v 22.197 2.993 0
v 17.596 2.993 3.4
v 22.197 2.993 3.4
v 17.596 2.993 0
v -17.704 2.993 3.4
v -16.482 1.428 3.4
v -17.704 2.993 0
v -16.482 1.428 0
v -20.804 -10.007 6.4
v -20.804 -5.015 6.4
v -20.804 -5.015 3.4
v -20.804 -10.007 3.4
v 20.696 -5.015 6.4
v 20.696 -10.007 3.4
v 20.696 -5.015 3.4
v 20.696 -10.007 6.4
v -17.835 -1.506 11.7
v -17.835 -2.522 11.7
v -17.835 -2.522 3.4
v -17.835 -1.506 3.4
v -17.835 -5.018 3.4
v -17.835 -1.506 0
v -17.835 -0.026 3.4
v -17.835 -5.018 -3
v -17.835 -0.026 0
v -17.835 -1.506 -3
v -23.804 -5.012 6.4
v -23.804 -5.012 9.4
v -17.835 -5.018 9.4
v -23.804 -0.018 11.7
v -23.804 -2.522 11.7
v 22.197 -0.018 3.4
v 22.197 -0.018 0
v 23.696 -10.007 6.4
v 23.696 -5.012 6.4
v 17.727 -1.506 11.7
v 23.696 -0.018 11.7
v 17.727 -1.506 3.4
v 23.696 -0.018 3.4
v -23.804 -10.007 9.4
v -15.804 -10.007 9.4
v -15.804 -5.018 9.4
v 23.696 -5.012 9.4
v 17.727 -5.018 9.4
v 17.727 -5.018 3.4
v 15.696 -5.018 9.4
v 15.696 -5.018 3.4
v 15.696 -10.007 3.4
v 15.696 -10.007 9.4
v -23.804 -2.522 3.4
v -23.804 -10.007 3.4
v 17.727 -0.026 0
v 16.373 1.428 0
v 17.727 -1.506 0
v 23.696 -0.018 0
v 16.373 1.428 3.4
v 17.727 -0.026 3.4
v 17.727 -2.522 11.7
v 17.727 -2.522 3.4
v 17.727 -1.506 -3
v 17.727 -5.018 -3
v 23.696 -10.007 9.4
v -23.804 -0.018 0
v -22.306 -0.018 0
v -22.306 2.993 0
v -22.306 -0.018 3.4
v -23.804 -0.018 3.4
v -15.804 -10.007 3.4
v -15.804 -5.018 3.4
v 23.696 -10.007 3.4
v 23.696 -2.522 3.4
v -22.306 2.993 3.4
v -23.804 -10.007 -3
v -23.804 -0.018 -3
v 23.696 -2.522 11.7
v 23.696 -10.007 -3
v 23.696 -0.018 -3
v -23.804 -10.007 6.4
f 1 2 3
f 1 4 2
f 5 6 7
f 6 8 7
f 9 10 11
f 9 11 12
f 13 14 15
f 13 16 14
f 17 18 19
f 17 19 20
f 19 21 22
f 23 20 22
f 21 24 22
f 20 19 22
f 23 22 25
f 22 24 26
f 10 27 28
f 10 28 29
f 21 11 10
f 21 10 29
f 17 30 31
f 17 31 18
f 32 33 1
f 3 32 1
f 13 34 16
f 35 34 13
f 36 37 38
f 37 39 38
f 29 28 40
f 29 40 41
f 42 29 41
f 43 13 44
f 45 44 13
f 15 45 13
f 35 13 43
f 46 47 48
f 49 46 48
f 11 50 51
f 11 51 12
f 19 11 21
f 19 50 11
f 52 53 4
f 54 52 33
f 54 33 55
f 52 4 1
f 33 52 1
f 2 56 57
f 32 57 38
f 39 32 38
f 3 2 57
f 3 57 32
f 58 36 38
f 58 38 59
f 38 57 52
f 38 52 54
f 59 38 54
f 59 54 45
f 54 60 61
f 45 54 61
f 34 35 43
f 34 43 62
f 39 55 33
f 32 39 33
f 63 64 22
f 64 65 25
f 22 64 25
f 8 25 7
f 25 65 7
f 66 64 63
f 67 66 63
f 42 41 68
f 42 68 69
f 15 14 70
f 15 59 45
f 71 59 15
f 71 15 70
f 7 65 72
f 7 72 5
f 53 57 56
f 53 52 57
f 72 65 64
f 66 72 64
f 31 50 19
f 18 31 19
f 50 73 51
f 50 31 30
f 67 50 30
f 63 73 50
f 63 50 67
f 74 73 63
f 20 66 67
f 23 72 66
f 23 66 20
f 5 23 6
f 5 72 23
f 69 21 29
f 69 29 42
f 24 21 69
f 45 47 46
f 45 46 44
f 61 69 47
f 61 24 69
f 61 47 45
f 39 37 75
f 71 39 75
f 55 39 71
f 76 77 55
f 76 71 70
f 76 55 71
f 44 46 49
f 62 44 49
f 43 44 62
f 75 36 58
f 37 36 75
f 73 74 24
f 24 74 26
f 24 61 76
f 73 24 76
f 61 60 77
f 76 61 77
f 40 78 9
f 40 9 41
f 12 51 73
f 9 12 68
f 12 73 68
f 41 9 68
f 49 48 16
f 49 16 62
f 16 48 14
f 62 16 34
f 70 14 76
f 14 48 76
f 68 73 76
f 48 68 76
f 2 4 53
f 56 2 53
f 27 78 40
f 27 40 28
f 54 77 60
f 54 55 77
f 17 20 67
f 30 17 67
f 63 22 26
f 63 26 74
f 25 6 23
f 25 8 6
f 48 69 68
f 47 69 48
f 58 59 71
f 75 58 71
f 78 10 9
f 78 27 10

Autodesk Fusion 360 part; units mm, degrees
sketch "Sketch1" plane through (0, 0, 0) normal (0, 0, 1) x (1, 0, 0)
  line L0 (23.6957, -0.0182) -> (23.6957, -10.0069)
  line L1 (-0.0543, -10.0069) -> (23.6957, -10.0069)
  line L2 (17.7267, -0.0264) -> (17.7267, -5.0176)
  line L3 (-0.0543, -5.0176) -> (17.7267, -5.0176)
  line L4 (5.1457, -10.0069) -> (5.1457, -5.0176)
  line L5 (17.7267, -0.0264) -> (16.3734, 1.4275)
  line L6 (17.5959, 2.993) -> (16.3734, 1.4275)
  line L7 (23.6957, -0.0182) -> (22.197, -0.0182)
  line L8 (23.6957, -0.0182) -> (17.7267, -1.5064)
  line L9 (-0.0543, -5.0176) -> (-0.0543, -10.0069)
  line L10 (17.5959, 2.993) -> (22.197, 2.993)
  line L11 (22.197, -0.0182) -> (22.197, 2.993)
  line L12 (23.6957, -0.0182) -> (22.197, -0.0182) construction
  line L13 (17.7267, -5.0176) -> (23.6957, -5.0125)
  line L14 (15.6957, -5.0176) -> (15.6957, -10.0069)
  line L15 (20.6957, -5.0176) -> (20.6957, -10.0069)
  line L16 (17.7267, -2.522) -> (23.6957, -2.522)
  point P0 (17.7267, -0.0264)
  point P1 (5.1457, -10.0069)
  dimension "latch_width" = 5.969
  dimension "d8" = 5.2
  dimension "d16" = 14
  dimension "d26" = 3
  dimension "d27" = 5
  dimension "d41" = 23.75
extrude "Extrude4" add sketch "Sketch1" along normal blind 3.4 makes body 1
extrude "Extrude9" add sketch "Sketch1" against normal blind 3 contours L0 L2 L8 L16 | L0 L2 L13 L16 | L0 L1 L3 L13 L14 | L1 L3 L4 L14 | L1 L3 L4 L9 bodies 1
extrude "Extrude5" add sketch "Sketch1" along normal blind 11.7 contours L0 L2 L8 L16 bodies 1
extrude "Extrude6" add sketch "Sketch1" along normal blind 9.4 contours L0 L1 L3 L13 L14 bodies 1
sketch "Sketch2" plane through (23.6957, 0, 0) normal (1, 0, 0) x (0, 1, 0)
  line L0 (-0.0182, 0) -> (-0.0182, 3.4)
  line L1 (-0.0182, 3.4) -> (-0.0182, 11.7)
  line L2 (-0.0182, 11.7) -> (-2.522, 11.7)
  line L3 (-2.522, 11.7) -> (-2.522, 3.4)
  line L4 (-2.522, 3.4) -> (-5.0125, 3.4)
  line L5 (-5.0125, 3.4) -> (-5.0125, 9.4)
  line L6 (-5.0125, 9.4) -> (-10.0069, 9.4)
  line L7 (-10.0069, 9.4) -> (-10.0069, -3)
  line L8 (-5.0125, 3.4) -> (-10.0069, 3.4)
  line L9 (-10.0069, 3.4) -> (-10.0069, 6.4)
  line L10 (-10.0069, 6.4) -> (-5.0125, 6.4)
  line L11 (-5.0125, 6.4) -> (-5.0125, 3.4)
  line L12 (-10.0069, -3) -> (-0.0182, -3)
  line L13 (-0.0182, -3) -> (-0.0182, 0)
  dimension "d34" = 3
extrude "Extrude7" cut sketch "Sketch2" against normal blind 3 contours L5 L7 L8 L9 L10 L11 bodies 1
mirror "Mirror1" about plane through (-0.0543, -5.0176, 0) normal (-1, 0, 0) of bodies 1 makes body 2
extrude "Extrude8" add 1 faces at (-0.0543, -8.3438, 1.2667) along direction (-1, 0, 0) blind 2 on bodies 1 bodies 1 2
equation "usbconn_width = 10.4 mm"
equation "usbconn_height = 8.3 mm"
equation "d8 = usbconn_width / 2"
equation "slot_height = 3.4 mm"
equation "d28 = slot_height"
equation "d30 = slot_height + usbconn_height"
equation "d32 = slot_height + 6 mm"
equation "d41 = width"
equation "width = 23.75 mm"
